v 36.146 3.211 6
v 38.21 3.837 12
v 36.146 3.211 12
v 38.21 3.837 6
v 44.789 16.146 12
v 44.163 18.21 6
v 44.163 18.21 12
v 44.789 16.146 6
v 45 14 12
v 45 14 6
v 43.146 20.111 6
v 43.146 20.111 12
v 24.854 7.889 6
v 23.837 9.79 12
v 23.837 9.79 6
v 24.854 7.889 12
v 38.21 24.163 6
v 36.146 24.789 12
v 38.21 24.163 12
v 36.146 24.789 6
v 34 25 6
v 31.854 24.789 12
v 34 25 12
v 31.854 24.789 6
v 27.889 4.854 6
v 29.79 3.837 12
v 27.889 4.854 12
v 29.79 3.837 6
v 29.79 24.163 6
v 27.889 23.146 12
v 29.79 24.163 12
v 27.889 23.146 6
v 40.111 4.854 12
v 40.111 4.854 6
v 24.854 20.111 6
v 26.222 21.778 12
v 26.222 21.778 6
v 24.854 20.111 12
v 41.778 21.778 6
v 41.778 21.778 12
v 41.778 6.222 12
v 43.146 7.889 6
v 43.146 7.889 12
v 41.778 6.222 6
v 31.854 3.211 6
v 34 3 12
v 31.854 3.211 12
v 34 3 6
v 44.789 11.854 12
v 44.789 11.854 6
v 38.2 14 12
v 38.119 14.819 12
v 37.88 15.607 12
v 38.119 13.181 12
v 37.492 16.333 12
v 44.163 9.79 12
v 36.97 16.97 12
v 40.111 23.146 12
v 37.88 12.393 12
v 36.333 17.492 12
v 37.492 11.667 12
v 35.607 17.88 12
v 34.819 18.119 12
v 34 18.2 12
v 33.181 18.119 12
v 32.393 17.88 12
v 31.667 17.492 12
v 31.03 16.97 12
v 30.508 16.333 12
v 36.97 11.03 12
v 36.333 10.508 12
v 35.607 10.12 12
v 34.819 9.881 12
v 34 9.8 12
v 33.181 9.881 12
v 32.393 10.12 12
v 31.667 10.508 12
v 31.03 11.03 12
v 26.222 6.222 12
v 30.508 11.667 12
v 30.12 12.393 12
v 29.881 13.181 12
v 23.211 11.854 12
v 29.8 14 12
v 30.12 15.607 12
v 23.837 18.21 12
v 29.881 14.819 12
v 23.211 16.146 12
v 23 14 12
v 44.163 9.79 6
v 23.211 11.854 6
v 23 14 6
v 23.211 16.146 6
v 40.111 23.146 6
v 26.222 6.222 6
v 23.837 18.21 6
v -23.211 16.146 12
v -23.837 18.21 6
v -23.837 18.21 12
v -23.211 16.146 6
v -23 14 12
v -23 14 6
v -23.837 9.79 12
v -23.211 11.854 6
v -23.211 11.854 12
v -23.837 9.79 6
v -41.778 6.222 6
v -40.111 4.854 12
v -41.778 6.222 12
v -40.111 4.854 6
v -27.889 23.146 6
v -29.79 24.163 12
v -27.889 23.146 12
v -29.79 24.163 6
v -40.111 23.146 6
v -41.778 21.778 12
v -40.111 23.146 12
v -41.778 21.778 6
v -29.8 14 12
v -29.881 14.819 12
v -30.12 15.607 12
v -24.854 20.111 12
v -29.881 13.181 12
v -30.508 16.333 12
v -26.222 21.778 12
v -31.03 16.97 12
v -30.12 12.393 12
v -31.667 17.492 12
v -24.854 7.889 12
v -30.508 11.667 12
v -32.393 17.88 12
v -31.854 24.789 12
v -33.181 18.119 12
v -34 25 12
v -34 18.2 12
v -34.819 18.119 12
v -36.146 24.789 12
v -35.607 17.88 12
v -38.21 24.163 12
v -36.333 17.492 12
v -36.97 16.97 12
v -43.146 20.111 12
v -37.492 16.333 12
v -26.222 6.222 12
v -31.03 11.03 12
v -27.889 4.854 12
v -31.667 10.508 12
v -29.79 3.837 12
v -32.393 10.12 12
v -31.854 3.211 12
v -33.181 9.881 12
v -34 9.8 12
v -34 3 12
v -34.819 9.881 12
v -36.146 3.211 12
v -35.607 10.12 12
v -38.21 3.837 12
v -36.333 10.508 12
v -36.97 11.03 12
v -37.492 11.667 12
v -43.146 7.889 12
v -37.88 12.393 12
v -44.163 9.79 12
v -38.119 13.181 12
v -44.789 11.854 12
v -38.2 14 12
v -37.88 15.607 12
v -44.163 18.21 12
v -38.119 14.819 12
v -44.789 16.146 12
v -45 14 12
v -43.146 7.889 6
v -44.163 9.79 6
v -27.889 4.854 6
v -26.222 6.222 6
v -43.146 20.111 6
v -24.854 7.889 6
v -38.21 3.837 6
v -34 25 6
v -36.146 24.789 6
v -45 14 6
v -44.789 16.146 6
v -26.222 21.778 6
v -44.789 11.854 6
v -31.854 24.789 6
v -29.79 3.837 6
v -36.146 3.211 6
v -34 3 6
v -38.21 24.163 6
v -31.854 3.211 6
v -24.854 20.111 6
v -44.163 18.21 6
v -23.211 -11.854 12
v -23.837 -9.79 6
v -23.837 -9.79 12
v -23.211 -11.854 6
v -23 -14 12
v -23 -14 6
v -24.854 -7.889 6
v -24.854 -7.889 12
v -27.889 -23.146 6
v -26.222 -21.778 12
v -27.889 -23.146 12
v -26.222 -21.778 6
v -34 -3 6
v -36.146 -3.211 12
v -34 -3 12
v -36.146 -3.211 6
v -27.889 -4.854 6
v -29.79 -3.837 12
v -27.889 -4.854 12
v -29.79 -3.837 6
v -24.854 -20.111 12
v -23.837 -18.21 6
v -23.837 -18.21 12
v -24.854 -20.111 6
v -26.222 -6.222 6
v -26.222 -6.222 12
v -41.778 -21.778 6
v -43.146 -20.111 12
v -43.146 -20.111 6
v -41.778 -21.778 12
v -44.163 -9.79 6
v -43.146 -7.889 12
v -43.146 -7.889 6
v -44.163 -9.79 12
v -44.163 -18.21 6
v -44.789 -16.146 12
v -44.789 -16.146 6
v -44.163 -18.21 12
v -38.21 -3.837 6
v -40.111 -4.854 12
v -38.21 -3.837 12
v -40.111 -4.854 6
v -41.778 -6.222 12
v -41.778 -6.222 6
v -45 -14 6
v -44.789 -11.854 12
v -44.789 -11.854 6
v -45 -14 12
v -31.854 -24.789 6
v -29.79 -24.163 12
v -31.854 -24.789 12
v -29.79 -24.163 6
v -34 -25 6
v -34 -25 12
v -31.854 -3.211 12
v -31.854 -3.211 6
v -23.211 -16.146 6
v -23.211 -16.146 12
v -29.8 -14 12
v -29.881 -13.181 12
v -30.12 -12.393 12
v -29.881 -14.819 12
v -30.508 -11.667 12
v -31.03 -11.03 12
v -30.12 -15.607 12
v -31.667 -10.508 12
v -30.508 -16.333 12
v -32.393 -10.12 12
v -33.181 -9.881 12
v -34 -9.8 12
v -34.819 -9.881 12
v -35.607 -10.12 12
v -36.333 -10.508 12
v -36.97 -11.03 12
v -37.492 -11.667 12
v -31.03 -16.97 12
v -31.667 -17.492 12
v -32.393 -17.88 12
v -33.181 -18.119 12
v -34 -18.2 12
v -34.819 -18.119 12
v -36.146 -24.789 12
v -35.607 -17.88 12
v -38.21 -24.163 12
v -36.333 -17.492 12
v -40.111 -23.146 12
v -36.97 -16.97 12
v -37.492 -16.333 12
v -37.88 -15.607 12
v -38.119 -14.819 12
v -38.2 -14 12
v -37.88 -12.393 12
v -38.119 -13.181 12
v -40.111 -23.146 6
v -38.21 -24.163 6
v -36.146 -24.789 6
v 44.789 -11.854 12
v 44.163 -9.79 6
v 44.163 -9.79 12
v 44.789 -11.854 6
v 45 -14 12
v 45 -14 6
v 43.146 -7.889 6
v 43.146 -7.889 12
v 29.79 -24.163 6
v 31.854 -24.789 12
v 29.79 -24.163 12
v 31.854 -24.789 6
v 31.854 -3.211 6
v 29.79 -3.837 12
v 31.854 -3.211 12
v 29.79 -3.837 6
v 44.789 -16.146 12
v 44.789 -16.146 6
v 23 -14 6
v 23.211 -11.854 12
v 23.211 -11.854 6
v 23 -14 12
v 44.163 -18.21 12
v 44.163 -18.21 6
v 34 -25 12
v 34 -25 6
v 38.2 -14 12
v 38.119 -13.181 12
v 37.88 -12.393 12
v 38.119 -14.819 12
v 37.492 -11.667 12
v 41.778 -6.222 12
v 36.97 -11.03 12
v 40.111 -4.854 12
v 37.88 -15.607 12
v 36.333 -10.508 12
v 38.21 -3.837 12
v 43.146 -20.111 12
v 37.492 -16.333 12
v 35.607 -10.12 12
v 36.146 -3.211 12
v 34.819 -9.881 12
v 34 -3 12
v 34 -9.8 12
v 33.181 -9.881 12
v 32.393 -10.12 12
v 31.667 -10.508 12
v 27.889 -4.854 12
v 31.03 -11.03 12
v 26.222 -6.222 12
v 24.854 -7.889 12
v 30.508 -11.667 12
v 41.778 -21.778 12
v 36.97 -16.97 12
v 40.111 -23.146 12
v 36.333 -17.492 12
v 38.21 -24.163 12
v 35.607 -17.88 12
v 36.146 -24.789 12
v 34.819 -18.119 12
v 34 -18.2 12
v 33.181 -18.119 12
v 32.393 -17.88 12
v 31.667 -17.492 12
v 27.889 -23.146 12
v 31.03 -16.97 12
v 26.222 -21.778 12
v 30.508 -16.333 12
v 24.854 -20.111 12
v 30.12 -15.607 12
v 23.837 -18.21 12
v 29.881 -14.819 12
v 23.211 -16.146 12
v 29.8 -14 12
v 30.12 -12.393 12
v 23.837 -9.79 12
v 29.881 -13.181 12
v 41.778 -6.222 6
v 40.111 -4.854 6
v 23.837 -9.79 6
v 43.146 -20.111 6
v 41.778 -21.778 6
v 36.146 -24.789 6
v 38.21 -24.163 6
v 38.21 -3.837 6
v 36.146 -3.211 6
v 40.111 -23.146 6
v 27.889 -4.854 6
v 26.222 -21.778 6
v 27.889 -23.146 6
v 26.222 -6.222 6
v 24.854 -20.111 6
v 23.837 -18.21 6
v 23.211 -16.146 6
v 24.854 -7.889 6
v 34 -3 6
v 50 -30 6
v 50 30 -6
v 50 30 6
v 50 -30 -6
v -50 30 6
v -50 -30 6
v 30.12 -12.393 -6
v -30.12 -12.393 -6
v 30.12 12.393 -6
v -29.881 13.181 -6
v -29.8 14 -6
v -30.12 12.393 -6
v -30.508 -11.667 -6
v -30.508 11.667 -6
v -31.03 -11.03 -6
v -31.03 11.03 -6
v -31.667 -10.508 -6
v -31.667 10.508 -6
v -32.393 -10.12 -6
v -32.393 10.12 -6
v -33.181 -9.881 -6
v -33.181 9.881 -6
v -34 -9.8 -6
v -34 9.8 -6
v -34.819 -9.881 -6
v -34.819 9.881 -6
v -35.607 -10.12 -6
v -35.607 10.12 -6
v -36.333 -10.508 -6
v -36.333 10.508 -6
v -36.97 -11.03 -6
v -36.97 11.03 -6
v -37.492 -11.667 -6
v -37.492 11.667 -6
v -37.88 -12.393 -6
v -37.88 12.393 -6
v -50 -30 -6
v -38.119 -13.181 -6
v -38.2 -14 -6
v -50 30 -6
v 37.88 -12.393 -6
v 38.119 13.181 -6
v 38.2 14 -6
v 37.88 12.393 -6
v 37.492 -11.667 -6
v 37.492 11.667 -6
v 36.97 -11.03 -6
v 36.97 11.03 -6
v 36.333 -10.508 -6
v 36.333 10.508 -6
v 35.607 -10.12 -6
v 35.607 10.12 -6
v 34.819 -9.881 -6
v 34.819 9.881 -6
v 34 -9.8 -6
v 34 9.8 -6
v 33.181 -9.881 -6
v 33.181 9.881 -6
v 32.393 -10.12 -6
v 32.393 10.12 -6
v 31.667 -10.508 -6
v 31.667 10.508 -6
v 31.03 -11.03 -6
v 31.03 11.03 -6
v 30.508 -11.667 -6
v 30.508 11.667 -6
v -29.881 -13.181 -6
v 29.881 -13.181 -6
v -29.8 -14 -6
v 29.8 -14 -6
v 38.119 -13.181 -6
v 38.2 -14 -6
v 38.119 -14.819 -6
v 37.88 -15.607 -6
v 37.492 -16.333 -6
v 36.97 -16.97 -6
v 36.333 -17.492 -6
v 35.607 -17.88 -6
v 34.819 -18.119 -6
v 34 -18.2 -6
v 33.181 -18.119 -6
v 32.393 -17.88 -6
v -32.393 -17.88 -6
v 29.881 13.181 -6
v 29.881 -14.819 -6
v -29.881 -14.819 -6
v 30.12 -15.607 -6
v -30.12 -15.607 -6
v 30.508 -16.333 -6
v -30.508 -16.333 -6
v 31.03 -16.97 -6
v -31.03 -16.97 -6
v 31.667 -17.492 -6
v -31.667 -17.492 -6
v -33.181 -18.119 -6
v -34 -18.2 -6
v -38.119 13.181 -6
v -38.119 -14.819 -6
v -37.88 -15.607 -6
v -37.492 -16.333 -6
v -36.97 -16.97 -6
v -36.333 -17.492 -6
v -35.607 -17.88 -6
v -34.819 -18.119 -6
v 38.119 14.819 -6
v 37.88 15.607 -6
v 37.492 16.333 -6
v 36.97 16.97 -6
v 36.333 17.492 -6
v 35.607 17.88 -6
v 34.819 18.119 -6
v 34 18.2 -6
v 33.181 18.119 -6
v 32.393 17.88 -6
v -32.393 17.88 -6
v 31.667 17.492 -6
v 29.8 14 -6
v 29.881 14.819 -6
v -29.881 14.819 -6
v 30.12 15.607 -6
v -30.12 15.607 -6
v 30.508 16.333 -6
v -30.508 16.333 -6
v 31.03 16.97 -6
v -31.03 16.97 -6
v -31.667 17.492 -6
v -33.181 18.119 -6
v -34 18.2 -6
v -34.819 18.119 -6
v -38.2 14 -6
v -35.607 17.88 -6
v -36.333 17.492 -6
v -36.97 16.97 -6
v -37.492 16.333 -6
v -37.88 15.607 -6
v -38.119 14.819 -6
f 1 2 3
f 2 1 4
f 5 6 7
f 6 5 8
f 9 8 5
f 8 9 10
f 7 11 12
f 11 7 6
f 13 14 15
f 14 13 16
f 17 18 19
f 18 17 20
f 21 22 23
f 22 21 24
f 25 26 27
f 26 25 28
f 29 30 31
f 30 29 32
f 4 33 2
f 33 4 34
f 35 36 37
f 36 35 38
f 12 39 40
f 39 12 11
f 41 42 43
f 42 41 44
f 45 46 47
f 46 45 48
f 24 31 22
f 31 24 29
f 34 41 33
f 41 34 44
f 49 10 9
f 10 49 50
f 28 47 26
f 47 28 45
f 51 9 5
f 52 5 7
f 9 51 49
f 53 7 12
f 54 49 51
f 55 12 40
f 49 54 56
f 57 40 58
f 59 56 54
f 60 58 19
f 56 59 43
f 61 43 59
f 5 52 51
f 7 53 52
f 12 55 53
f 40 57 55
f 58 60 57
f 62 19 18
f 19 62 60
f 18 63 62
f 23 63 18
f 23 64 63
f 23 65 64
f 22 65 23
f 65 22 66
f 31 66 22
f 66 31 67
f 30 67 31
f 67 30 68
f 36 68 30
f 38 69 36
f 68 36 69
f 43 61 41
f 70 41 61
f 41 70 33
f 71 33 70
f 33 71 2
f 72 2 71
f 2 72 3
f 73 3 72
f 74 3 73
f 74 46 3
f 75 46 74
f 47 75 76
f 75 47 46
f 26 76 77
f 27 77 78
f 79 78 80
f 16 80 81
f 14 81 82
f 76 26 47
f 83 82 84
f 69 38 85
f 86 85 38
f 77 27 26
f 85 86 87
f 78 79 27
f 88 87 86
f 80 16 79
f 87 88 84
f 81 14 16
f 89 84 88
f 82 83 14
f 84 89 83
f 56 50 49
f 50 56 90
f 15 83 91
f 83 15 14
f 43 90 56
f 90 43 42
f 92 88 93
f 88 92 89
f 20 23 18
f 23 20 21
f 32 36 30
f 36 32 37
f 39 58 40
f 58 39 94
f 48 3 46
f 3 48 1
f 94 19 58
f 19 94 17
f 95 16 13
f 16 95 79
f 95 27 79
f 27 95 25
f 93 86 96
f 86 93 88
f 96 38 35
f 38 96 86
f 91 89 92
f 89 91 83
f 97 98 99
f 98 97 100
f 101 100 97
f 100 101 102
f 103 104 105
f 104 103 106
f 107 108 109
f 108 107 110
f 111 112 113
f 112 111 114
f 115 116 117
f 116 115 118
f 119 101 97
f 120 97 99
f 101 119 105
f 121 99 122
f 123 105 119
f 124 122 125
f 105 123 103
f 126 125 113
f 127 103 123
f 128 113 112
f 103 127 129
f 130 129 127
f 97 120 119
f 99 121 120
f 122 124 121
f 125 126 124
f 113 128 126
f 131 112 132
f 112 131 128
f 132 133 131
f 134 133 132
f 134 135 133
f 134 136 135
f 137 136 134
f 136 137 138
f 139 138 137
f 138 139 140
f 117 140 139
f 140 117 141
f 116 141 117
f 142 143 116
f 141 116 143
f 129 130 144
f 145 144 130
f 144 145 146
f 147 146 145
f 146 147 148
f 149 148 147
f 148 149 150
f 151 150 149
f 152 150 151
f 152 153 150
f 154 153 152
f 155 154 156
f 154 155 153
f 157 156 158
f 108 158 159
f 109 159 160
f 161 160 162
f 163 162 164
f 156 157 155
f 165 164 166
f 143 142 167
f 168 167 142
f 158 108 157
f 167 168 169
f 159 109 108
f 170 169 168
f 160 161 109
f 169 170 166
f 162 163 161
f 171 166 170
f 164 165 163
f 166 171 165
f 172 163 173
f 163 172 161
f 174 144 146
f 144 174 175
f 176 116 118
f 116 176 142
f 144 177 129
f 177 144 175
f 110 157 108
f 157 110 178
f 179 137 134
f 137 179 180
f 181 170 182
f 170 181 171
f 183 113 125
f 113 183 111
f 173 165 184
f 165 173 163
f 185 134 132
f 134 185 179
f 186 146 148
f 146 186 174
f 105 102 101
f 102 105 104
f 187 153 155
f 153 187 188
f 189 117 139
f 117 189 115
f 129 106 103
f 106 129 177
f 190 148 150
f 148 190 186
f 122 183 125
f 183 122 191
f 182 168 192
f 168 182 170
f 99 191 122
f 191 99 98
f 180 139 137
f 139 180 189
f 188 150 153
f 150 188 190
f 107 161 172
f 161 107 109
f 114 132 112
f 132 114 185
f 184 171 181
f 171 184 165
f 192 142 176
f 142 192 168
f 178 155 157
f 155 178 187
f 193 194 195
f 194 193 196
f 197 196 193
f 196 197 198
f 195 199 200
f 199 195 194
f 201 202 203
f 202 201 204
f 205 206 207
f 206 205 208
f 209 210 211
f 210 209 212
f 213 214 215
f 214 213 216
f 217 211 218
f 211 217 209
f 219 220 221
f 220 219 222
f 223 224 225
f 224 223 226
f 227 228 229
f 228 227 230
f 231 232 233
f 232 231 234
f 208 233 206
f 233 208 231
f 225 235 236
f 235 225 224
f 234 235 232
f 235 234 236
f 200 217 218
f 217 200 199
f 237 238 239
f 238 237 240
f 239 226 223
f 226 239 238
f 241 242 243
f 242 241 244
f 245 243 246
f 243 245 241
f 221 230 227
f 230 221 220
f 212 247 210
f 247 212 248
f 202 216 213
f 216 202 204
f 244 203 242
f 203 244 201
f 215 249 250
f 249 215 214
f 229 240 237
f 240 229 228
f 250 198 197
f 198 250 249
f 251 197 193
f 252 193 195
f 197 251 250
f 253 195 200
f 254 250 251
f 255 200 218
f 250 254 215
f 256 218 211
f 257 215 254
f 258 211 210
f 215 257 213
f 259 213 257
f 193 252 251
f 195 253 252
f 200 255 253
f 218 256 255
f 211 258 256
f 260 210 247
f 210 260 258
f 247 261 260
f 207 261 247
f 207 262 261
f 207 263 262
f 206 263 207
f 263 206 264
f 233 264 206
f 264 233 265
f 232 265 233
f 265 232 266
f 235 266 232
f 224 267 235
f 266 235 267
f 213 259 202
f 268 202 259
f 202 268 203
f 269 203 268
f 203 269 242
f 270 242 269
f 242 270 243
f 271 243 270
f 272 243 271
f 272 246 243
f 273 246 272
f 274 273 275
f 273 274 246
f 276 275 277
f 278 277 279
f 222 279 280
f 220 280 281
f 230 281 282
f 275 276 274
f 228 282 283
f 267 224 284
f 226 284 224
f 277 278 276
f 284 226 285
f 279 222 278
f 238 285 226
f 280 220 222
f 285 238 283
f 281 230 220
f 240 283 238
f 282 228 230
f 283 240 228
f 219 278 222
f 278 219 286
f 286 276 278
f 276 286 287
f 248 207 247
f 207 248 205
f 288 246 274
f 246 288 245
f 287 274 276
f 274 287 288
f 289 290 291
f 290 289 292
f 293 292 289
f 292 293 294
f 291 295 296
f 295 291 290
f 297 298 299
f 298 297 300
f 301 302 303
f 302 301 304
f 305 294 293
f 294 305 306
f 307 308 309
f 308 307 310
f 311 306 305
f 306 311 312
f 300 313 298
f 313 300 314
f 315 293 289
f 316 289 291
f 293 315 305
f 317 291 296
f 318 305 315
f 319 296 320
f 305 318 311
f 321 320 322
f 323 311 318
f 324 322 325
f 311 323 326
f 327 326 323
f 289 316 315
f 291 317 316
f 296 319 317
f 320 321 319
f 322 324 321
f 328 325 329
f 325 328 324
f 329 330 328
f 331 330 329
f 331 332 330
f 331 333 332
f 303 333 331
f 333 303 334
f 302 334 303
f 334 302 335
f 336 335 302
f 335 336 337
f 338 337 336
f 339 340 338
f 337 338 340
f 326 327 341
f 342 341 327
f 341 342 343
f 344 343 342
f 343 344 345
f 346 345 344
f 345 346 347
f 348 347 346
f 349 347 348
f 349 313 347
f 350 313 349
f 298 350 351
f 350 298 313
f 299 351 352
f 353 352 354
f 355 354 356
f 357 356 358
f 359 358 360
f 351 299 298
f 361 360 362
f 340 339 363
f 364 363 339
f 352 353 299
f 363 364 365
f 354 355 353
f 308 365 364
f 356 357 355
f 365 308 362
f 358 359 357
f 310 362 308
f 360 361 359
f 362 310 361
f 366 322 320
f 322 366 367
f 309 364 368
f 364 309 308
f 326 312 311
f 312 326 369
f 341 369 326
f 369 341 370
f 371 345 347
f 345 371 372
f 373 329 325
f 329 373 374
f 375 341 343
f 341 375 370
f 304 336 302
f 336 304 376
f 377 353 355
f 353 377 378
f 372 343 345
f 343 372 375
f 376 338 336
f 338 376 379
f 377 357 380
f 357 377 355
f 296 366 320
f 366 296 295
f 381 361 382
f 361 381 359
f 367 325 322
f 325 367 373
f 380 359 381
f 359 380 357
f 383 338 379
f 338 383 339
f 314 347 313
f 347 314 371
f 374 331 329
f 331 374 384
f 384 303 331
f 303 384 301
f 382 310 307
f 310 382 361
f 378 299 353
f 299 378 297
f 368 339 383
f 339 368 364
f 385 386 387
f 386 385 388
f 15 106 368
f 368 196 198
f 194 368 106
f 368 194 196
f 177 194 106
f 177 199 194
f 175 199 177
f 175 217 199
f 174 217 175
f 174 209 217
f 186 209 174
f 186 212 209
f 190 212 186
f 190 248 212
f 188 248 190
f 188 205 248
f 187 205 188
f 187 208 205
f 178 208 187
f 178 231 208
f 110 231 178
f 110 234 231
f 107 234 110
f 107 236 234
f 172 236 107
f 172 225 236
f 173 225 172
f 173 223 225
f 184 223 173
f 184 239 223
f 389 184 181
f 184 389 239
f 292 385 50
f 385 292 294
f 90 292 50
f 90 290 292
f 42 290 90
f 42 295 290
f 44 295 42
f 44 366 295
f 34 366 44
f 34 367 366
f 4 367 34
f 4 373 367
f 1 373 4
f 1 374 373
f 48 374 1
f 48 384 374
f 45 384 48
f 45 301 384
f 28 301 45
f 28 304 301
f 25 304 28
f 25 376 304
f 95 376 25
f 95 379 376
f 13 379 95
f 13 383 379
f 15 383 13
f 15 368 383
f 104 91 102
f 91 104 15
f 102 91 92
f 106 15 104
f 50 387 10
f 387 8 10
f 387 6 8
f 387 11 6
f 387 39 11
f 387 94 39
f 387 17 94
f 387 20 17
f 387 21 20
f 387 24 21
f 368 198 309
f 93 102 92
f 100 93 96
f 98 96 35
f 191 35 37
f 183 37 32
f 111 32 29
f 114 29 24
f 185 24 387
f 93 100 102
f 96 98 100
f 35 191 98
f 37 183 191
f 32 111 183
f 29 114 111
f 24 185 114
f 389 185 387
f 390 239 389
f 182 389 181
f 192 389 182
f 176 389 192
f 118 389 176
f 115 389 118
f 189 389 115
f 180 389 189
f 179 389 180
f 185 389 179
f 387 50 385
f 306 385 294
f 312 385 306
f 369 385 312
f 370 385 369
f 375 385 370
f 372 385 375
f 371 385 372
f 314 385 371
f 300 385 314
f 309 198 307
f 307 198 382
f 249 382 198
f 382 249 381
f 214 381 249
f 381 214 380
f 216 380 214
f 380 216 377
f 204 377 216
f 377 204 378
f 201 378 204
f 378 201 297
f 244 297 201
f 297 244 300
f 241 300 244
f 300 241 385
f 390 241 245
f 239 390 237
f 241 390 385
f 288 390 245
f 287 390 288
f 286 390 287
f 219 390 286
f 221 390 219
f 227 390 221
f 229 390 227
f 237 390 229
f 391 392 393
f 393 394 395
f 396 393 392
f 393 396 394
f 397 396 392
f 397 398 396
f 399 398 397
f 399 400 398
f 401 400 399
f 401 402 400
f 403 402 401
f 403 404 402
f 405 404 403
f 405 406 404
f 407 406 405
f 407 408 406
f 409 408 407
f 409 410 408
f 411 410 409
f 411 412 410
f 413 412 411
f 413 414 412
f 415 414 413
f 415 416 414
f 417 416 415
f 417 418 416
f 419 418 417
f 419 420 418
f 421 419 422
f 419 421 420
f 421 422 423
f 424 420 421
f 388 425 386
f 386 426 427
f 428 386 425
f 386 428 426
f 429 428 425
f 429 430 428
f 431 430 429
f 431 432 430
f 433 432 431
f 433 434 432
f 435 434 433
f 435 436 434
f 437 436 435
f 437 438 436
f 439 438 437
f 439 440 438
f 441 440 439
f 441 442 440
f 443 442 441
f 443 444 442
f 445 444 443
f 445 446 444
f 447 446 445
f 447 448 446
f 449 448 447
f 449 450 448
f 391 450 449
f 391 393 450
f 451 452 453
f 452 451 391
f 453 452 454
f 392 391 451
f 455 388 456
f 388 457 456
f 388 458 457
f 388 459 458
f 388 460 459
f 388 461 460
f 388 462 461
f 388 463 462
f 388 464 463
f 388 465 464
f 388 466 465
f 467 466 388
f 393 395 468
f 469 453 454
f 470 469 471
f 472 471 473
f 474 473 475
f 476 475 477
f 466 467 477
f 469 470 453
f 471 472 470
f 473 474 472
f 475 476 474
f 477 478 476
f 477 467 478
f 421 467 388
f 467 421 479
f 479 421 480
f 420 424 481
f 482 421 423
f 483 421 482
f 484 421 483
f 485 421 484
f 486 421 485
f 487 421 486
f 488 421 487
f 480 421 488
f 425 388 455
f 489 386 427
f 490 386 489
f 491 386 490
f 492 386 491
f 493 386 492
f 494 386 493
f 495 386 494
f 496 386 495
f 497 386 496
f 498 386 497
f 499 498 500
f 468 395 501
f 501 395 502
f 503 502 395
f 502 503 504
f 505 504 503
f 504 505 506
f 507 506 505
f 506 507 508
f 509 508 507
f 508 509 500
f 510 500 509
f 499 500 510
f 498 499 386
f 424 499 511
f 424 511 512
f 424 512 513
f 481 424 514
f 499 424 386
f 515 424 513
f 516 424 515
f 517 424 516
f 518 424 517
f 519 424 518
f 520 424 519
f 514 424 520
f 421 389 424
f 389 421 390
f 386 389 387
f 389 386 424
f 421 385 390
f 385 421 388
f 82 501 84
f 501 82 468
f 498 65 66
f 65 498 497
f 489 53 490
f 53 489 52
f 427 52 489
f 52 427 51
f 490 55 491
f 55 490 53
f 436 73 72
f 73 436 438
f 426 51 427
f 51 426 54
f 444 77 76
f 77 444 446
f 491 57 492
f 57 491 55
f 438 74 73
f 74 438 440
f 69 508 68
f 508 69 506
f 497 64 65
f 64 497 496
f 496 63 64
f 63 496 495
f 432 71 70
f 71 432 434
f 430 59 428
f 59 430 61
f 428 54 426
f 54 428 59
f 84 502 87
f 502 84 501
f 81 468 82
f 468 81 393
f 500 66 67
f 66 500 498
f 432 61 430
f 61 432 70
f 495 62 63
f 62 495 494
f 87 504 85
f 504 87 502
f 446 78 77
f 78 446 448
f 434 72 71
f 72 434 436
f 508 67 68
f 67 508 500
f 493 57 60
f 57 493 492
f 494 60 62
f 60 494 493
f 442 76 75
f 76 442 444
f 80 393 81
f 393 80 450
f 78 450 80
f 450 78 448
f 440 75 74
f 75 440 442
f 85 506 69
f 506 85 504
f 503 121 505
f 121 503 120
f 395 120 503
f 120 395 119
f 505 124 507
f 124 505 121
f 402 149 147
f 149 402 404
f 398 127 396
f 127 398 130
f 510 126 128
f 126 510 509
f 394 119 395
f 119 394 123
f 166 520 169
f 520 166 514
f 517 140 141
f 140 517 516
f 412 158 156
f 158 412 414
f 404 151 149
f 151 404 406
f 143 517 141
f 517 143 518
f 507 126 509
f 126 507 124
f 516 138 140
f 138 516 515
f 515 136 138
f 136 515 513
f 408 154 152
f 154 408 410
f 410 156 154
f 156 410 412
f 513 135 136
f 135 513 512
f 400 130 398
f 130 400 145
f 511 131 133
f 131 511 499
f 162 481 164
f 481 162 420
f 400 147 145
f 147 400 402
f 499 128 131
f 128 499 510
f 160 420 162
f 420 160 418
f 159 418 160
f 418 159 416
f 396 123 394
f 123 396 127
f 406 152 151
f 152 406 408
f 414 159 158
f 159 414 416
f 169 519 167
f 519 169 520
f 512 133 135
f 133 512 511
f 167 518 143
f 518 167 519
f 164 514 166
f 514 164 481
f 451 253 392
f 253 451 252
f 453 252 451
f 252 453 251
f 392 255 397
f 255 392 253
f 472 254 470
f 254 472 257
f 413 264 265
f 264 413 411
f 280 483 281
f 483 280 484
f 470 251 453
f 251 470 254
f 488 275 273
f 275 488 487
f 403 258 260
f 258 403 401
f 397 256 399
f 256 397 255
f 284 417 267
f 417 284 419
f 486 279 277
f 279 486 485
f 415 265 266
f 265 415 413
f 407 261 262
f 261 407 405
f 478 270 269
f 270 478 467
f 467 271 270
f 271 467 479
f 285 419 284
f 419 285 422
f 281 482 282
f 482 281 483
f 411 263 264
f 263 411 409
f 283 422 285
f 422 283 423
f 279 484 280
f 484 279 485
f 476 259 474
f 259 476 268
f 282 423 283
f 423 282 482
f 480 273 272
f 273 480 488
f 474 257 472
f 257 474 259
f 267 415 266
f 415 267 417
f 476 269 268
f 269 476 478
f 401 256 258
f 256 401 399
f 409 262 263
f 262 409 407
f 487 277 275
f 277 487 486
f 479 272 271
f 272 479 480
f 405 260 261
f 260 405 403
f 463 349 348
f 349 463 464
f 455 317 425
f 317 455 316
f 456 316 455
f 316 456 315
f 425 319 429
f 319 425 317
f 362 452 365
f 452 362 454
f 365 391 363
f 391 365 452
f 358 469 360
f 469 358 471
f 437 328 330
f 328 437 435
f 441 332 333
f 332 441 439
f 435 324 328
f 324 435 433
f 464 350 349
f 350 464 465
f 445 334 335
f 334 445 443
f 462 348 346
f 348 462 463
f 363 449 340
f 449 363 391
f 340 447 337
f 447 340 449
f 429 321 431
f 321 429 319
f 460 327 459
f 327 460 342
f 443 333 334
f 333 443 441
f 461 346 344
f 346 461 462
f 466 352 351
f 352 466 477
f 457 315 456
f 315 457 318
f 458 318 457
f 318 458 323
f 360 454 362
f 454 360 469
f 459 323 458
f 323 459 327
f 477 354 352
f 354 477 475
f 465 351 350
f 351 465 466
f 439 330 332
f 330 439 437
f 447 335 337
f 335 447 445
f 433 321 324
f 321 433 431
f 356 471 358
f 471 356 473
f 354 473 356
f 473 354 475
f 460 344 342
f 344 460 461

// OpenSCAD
$fn = 32;

// ----------------------------------------------------------------------
// Anchor pads 100 x 60 x 18
// four corner bosses with anchor holes
// ----------------------------------------------------------------------

// --- parameters (mm) ---
plate = [100, 60, 12];  // base plate size (x, y, z)
seat_tol = 0.15;        // tolerance at the seating features
free_tol = 0.5;         // general tolerance on the free sizes
pads = 4;               // boss count, one per corner
edge = 16;              // boss centre offset from the plate edge
boss_d = 22;            // boss diameter
boss_h = 6;             // boss height above the base plate
hole_d = 8.4;           // hole diameter

// --- derived feature positions (mm) ---
height = plate[2] + boss_h;      // = 18   overall height of the part
corner_x = plate[0] / 2 - edge;  // = 34   boss centre X
corner_y = plate[1] / 2 - edge;  // = 14   boss centre Y
feature_centers = [
  [corner_x, corner_y],
  [-corner_x, corner_y],
  [-corner_x, -corner_y],
  [corner_x, -corner_y]
];   // boss centres, anchor holes are drilled there

// base plate, four bosses standing on it, anchor holes all the way through
difference() {
  union() {
    cube(plate, center = true);
    for (centre = feature_centers)
      translate([centre[0], centre[1], plate[2] / 2 - 1])
        cylinder(d = boss_d, h = boss_h + 1);
  }
  for (centre = feature_centers)
    translate([centre[0], centre[1], -height])
      cylinder(d = hole_d, h = 2 * height + 2);  // through boss and plate
}
